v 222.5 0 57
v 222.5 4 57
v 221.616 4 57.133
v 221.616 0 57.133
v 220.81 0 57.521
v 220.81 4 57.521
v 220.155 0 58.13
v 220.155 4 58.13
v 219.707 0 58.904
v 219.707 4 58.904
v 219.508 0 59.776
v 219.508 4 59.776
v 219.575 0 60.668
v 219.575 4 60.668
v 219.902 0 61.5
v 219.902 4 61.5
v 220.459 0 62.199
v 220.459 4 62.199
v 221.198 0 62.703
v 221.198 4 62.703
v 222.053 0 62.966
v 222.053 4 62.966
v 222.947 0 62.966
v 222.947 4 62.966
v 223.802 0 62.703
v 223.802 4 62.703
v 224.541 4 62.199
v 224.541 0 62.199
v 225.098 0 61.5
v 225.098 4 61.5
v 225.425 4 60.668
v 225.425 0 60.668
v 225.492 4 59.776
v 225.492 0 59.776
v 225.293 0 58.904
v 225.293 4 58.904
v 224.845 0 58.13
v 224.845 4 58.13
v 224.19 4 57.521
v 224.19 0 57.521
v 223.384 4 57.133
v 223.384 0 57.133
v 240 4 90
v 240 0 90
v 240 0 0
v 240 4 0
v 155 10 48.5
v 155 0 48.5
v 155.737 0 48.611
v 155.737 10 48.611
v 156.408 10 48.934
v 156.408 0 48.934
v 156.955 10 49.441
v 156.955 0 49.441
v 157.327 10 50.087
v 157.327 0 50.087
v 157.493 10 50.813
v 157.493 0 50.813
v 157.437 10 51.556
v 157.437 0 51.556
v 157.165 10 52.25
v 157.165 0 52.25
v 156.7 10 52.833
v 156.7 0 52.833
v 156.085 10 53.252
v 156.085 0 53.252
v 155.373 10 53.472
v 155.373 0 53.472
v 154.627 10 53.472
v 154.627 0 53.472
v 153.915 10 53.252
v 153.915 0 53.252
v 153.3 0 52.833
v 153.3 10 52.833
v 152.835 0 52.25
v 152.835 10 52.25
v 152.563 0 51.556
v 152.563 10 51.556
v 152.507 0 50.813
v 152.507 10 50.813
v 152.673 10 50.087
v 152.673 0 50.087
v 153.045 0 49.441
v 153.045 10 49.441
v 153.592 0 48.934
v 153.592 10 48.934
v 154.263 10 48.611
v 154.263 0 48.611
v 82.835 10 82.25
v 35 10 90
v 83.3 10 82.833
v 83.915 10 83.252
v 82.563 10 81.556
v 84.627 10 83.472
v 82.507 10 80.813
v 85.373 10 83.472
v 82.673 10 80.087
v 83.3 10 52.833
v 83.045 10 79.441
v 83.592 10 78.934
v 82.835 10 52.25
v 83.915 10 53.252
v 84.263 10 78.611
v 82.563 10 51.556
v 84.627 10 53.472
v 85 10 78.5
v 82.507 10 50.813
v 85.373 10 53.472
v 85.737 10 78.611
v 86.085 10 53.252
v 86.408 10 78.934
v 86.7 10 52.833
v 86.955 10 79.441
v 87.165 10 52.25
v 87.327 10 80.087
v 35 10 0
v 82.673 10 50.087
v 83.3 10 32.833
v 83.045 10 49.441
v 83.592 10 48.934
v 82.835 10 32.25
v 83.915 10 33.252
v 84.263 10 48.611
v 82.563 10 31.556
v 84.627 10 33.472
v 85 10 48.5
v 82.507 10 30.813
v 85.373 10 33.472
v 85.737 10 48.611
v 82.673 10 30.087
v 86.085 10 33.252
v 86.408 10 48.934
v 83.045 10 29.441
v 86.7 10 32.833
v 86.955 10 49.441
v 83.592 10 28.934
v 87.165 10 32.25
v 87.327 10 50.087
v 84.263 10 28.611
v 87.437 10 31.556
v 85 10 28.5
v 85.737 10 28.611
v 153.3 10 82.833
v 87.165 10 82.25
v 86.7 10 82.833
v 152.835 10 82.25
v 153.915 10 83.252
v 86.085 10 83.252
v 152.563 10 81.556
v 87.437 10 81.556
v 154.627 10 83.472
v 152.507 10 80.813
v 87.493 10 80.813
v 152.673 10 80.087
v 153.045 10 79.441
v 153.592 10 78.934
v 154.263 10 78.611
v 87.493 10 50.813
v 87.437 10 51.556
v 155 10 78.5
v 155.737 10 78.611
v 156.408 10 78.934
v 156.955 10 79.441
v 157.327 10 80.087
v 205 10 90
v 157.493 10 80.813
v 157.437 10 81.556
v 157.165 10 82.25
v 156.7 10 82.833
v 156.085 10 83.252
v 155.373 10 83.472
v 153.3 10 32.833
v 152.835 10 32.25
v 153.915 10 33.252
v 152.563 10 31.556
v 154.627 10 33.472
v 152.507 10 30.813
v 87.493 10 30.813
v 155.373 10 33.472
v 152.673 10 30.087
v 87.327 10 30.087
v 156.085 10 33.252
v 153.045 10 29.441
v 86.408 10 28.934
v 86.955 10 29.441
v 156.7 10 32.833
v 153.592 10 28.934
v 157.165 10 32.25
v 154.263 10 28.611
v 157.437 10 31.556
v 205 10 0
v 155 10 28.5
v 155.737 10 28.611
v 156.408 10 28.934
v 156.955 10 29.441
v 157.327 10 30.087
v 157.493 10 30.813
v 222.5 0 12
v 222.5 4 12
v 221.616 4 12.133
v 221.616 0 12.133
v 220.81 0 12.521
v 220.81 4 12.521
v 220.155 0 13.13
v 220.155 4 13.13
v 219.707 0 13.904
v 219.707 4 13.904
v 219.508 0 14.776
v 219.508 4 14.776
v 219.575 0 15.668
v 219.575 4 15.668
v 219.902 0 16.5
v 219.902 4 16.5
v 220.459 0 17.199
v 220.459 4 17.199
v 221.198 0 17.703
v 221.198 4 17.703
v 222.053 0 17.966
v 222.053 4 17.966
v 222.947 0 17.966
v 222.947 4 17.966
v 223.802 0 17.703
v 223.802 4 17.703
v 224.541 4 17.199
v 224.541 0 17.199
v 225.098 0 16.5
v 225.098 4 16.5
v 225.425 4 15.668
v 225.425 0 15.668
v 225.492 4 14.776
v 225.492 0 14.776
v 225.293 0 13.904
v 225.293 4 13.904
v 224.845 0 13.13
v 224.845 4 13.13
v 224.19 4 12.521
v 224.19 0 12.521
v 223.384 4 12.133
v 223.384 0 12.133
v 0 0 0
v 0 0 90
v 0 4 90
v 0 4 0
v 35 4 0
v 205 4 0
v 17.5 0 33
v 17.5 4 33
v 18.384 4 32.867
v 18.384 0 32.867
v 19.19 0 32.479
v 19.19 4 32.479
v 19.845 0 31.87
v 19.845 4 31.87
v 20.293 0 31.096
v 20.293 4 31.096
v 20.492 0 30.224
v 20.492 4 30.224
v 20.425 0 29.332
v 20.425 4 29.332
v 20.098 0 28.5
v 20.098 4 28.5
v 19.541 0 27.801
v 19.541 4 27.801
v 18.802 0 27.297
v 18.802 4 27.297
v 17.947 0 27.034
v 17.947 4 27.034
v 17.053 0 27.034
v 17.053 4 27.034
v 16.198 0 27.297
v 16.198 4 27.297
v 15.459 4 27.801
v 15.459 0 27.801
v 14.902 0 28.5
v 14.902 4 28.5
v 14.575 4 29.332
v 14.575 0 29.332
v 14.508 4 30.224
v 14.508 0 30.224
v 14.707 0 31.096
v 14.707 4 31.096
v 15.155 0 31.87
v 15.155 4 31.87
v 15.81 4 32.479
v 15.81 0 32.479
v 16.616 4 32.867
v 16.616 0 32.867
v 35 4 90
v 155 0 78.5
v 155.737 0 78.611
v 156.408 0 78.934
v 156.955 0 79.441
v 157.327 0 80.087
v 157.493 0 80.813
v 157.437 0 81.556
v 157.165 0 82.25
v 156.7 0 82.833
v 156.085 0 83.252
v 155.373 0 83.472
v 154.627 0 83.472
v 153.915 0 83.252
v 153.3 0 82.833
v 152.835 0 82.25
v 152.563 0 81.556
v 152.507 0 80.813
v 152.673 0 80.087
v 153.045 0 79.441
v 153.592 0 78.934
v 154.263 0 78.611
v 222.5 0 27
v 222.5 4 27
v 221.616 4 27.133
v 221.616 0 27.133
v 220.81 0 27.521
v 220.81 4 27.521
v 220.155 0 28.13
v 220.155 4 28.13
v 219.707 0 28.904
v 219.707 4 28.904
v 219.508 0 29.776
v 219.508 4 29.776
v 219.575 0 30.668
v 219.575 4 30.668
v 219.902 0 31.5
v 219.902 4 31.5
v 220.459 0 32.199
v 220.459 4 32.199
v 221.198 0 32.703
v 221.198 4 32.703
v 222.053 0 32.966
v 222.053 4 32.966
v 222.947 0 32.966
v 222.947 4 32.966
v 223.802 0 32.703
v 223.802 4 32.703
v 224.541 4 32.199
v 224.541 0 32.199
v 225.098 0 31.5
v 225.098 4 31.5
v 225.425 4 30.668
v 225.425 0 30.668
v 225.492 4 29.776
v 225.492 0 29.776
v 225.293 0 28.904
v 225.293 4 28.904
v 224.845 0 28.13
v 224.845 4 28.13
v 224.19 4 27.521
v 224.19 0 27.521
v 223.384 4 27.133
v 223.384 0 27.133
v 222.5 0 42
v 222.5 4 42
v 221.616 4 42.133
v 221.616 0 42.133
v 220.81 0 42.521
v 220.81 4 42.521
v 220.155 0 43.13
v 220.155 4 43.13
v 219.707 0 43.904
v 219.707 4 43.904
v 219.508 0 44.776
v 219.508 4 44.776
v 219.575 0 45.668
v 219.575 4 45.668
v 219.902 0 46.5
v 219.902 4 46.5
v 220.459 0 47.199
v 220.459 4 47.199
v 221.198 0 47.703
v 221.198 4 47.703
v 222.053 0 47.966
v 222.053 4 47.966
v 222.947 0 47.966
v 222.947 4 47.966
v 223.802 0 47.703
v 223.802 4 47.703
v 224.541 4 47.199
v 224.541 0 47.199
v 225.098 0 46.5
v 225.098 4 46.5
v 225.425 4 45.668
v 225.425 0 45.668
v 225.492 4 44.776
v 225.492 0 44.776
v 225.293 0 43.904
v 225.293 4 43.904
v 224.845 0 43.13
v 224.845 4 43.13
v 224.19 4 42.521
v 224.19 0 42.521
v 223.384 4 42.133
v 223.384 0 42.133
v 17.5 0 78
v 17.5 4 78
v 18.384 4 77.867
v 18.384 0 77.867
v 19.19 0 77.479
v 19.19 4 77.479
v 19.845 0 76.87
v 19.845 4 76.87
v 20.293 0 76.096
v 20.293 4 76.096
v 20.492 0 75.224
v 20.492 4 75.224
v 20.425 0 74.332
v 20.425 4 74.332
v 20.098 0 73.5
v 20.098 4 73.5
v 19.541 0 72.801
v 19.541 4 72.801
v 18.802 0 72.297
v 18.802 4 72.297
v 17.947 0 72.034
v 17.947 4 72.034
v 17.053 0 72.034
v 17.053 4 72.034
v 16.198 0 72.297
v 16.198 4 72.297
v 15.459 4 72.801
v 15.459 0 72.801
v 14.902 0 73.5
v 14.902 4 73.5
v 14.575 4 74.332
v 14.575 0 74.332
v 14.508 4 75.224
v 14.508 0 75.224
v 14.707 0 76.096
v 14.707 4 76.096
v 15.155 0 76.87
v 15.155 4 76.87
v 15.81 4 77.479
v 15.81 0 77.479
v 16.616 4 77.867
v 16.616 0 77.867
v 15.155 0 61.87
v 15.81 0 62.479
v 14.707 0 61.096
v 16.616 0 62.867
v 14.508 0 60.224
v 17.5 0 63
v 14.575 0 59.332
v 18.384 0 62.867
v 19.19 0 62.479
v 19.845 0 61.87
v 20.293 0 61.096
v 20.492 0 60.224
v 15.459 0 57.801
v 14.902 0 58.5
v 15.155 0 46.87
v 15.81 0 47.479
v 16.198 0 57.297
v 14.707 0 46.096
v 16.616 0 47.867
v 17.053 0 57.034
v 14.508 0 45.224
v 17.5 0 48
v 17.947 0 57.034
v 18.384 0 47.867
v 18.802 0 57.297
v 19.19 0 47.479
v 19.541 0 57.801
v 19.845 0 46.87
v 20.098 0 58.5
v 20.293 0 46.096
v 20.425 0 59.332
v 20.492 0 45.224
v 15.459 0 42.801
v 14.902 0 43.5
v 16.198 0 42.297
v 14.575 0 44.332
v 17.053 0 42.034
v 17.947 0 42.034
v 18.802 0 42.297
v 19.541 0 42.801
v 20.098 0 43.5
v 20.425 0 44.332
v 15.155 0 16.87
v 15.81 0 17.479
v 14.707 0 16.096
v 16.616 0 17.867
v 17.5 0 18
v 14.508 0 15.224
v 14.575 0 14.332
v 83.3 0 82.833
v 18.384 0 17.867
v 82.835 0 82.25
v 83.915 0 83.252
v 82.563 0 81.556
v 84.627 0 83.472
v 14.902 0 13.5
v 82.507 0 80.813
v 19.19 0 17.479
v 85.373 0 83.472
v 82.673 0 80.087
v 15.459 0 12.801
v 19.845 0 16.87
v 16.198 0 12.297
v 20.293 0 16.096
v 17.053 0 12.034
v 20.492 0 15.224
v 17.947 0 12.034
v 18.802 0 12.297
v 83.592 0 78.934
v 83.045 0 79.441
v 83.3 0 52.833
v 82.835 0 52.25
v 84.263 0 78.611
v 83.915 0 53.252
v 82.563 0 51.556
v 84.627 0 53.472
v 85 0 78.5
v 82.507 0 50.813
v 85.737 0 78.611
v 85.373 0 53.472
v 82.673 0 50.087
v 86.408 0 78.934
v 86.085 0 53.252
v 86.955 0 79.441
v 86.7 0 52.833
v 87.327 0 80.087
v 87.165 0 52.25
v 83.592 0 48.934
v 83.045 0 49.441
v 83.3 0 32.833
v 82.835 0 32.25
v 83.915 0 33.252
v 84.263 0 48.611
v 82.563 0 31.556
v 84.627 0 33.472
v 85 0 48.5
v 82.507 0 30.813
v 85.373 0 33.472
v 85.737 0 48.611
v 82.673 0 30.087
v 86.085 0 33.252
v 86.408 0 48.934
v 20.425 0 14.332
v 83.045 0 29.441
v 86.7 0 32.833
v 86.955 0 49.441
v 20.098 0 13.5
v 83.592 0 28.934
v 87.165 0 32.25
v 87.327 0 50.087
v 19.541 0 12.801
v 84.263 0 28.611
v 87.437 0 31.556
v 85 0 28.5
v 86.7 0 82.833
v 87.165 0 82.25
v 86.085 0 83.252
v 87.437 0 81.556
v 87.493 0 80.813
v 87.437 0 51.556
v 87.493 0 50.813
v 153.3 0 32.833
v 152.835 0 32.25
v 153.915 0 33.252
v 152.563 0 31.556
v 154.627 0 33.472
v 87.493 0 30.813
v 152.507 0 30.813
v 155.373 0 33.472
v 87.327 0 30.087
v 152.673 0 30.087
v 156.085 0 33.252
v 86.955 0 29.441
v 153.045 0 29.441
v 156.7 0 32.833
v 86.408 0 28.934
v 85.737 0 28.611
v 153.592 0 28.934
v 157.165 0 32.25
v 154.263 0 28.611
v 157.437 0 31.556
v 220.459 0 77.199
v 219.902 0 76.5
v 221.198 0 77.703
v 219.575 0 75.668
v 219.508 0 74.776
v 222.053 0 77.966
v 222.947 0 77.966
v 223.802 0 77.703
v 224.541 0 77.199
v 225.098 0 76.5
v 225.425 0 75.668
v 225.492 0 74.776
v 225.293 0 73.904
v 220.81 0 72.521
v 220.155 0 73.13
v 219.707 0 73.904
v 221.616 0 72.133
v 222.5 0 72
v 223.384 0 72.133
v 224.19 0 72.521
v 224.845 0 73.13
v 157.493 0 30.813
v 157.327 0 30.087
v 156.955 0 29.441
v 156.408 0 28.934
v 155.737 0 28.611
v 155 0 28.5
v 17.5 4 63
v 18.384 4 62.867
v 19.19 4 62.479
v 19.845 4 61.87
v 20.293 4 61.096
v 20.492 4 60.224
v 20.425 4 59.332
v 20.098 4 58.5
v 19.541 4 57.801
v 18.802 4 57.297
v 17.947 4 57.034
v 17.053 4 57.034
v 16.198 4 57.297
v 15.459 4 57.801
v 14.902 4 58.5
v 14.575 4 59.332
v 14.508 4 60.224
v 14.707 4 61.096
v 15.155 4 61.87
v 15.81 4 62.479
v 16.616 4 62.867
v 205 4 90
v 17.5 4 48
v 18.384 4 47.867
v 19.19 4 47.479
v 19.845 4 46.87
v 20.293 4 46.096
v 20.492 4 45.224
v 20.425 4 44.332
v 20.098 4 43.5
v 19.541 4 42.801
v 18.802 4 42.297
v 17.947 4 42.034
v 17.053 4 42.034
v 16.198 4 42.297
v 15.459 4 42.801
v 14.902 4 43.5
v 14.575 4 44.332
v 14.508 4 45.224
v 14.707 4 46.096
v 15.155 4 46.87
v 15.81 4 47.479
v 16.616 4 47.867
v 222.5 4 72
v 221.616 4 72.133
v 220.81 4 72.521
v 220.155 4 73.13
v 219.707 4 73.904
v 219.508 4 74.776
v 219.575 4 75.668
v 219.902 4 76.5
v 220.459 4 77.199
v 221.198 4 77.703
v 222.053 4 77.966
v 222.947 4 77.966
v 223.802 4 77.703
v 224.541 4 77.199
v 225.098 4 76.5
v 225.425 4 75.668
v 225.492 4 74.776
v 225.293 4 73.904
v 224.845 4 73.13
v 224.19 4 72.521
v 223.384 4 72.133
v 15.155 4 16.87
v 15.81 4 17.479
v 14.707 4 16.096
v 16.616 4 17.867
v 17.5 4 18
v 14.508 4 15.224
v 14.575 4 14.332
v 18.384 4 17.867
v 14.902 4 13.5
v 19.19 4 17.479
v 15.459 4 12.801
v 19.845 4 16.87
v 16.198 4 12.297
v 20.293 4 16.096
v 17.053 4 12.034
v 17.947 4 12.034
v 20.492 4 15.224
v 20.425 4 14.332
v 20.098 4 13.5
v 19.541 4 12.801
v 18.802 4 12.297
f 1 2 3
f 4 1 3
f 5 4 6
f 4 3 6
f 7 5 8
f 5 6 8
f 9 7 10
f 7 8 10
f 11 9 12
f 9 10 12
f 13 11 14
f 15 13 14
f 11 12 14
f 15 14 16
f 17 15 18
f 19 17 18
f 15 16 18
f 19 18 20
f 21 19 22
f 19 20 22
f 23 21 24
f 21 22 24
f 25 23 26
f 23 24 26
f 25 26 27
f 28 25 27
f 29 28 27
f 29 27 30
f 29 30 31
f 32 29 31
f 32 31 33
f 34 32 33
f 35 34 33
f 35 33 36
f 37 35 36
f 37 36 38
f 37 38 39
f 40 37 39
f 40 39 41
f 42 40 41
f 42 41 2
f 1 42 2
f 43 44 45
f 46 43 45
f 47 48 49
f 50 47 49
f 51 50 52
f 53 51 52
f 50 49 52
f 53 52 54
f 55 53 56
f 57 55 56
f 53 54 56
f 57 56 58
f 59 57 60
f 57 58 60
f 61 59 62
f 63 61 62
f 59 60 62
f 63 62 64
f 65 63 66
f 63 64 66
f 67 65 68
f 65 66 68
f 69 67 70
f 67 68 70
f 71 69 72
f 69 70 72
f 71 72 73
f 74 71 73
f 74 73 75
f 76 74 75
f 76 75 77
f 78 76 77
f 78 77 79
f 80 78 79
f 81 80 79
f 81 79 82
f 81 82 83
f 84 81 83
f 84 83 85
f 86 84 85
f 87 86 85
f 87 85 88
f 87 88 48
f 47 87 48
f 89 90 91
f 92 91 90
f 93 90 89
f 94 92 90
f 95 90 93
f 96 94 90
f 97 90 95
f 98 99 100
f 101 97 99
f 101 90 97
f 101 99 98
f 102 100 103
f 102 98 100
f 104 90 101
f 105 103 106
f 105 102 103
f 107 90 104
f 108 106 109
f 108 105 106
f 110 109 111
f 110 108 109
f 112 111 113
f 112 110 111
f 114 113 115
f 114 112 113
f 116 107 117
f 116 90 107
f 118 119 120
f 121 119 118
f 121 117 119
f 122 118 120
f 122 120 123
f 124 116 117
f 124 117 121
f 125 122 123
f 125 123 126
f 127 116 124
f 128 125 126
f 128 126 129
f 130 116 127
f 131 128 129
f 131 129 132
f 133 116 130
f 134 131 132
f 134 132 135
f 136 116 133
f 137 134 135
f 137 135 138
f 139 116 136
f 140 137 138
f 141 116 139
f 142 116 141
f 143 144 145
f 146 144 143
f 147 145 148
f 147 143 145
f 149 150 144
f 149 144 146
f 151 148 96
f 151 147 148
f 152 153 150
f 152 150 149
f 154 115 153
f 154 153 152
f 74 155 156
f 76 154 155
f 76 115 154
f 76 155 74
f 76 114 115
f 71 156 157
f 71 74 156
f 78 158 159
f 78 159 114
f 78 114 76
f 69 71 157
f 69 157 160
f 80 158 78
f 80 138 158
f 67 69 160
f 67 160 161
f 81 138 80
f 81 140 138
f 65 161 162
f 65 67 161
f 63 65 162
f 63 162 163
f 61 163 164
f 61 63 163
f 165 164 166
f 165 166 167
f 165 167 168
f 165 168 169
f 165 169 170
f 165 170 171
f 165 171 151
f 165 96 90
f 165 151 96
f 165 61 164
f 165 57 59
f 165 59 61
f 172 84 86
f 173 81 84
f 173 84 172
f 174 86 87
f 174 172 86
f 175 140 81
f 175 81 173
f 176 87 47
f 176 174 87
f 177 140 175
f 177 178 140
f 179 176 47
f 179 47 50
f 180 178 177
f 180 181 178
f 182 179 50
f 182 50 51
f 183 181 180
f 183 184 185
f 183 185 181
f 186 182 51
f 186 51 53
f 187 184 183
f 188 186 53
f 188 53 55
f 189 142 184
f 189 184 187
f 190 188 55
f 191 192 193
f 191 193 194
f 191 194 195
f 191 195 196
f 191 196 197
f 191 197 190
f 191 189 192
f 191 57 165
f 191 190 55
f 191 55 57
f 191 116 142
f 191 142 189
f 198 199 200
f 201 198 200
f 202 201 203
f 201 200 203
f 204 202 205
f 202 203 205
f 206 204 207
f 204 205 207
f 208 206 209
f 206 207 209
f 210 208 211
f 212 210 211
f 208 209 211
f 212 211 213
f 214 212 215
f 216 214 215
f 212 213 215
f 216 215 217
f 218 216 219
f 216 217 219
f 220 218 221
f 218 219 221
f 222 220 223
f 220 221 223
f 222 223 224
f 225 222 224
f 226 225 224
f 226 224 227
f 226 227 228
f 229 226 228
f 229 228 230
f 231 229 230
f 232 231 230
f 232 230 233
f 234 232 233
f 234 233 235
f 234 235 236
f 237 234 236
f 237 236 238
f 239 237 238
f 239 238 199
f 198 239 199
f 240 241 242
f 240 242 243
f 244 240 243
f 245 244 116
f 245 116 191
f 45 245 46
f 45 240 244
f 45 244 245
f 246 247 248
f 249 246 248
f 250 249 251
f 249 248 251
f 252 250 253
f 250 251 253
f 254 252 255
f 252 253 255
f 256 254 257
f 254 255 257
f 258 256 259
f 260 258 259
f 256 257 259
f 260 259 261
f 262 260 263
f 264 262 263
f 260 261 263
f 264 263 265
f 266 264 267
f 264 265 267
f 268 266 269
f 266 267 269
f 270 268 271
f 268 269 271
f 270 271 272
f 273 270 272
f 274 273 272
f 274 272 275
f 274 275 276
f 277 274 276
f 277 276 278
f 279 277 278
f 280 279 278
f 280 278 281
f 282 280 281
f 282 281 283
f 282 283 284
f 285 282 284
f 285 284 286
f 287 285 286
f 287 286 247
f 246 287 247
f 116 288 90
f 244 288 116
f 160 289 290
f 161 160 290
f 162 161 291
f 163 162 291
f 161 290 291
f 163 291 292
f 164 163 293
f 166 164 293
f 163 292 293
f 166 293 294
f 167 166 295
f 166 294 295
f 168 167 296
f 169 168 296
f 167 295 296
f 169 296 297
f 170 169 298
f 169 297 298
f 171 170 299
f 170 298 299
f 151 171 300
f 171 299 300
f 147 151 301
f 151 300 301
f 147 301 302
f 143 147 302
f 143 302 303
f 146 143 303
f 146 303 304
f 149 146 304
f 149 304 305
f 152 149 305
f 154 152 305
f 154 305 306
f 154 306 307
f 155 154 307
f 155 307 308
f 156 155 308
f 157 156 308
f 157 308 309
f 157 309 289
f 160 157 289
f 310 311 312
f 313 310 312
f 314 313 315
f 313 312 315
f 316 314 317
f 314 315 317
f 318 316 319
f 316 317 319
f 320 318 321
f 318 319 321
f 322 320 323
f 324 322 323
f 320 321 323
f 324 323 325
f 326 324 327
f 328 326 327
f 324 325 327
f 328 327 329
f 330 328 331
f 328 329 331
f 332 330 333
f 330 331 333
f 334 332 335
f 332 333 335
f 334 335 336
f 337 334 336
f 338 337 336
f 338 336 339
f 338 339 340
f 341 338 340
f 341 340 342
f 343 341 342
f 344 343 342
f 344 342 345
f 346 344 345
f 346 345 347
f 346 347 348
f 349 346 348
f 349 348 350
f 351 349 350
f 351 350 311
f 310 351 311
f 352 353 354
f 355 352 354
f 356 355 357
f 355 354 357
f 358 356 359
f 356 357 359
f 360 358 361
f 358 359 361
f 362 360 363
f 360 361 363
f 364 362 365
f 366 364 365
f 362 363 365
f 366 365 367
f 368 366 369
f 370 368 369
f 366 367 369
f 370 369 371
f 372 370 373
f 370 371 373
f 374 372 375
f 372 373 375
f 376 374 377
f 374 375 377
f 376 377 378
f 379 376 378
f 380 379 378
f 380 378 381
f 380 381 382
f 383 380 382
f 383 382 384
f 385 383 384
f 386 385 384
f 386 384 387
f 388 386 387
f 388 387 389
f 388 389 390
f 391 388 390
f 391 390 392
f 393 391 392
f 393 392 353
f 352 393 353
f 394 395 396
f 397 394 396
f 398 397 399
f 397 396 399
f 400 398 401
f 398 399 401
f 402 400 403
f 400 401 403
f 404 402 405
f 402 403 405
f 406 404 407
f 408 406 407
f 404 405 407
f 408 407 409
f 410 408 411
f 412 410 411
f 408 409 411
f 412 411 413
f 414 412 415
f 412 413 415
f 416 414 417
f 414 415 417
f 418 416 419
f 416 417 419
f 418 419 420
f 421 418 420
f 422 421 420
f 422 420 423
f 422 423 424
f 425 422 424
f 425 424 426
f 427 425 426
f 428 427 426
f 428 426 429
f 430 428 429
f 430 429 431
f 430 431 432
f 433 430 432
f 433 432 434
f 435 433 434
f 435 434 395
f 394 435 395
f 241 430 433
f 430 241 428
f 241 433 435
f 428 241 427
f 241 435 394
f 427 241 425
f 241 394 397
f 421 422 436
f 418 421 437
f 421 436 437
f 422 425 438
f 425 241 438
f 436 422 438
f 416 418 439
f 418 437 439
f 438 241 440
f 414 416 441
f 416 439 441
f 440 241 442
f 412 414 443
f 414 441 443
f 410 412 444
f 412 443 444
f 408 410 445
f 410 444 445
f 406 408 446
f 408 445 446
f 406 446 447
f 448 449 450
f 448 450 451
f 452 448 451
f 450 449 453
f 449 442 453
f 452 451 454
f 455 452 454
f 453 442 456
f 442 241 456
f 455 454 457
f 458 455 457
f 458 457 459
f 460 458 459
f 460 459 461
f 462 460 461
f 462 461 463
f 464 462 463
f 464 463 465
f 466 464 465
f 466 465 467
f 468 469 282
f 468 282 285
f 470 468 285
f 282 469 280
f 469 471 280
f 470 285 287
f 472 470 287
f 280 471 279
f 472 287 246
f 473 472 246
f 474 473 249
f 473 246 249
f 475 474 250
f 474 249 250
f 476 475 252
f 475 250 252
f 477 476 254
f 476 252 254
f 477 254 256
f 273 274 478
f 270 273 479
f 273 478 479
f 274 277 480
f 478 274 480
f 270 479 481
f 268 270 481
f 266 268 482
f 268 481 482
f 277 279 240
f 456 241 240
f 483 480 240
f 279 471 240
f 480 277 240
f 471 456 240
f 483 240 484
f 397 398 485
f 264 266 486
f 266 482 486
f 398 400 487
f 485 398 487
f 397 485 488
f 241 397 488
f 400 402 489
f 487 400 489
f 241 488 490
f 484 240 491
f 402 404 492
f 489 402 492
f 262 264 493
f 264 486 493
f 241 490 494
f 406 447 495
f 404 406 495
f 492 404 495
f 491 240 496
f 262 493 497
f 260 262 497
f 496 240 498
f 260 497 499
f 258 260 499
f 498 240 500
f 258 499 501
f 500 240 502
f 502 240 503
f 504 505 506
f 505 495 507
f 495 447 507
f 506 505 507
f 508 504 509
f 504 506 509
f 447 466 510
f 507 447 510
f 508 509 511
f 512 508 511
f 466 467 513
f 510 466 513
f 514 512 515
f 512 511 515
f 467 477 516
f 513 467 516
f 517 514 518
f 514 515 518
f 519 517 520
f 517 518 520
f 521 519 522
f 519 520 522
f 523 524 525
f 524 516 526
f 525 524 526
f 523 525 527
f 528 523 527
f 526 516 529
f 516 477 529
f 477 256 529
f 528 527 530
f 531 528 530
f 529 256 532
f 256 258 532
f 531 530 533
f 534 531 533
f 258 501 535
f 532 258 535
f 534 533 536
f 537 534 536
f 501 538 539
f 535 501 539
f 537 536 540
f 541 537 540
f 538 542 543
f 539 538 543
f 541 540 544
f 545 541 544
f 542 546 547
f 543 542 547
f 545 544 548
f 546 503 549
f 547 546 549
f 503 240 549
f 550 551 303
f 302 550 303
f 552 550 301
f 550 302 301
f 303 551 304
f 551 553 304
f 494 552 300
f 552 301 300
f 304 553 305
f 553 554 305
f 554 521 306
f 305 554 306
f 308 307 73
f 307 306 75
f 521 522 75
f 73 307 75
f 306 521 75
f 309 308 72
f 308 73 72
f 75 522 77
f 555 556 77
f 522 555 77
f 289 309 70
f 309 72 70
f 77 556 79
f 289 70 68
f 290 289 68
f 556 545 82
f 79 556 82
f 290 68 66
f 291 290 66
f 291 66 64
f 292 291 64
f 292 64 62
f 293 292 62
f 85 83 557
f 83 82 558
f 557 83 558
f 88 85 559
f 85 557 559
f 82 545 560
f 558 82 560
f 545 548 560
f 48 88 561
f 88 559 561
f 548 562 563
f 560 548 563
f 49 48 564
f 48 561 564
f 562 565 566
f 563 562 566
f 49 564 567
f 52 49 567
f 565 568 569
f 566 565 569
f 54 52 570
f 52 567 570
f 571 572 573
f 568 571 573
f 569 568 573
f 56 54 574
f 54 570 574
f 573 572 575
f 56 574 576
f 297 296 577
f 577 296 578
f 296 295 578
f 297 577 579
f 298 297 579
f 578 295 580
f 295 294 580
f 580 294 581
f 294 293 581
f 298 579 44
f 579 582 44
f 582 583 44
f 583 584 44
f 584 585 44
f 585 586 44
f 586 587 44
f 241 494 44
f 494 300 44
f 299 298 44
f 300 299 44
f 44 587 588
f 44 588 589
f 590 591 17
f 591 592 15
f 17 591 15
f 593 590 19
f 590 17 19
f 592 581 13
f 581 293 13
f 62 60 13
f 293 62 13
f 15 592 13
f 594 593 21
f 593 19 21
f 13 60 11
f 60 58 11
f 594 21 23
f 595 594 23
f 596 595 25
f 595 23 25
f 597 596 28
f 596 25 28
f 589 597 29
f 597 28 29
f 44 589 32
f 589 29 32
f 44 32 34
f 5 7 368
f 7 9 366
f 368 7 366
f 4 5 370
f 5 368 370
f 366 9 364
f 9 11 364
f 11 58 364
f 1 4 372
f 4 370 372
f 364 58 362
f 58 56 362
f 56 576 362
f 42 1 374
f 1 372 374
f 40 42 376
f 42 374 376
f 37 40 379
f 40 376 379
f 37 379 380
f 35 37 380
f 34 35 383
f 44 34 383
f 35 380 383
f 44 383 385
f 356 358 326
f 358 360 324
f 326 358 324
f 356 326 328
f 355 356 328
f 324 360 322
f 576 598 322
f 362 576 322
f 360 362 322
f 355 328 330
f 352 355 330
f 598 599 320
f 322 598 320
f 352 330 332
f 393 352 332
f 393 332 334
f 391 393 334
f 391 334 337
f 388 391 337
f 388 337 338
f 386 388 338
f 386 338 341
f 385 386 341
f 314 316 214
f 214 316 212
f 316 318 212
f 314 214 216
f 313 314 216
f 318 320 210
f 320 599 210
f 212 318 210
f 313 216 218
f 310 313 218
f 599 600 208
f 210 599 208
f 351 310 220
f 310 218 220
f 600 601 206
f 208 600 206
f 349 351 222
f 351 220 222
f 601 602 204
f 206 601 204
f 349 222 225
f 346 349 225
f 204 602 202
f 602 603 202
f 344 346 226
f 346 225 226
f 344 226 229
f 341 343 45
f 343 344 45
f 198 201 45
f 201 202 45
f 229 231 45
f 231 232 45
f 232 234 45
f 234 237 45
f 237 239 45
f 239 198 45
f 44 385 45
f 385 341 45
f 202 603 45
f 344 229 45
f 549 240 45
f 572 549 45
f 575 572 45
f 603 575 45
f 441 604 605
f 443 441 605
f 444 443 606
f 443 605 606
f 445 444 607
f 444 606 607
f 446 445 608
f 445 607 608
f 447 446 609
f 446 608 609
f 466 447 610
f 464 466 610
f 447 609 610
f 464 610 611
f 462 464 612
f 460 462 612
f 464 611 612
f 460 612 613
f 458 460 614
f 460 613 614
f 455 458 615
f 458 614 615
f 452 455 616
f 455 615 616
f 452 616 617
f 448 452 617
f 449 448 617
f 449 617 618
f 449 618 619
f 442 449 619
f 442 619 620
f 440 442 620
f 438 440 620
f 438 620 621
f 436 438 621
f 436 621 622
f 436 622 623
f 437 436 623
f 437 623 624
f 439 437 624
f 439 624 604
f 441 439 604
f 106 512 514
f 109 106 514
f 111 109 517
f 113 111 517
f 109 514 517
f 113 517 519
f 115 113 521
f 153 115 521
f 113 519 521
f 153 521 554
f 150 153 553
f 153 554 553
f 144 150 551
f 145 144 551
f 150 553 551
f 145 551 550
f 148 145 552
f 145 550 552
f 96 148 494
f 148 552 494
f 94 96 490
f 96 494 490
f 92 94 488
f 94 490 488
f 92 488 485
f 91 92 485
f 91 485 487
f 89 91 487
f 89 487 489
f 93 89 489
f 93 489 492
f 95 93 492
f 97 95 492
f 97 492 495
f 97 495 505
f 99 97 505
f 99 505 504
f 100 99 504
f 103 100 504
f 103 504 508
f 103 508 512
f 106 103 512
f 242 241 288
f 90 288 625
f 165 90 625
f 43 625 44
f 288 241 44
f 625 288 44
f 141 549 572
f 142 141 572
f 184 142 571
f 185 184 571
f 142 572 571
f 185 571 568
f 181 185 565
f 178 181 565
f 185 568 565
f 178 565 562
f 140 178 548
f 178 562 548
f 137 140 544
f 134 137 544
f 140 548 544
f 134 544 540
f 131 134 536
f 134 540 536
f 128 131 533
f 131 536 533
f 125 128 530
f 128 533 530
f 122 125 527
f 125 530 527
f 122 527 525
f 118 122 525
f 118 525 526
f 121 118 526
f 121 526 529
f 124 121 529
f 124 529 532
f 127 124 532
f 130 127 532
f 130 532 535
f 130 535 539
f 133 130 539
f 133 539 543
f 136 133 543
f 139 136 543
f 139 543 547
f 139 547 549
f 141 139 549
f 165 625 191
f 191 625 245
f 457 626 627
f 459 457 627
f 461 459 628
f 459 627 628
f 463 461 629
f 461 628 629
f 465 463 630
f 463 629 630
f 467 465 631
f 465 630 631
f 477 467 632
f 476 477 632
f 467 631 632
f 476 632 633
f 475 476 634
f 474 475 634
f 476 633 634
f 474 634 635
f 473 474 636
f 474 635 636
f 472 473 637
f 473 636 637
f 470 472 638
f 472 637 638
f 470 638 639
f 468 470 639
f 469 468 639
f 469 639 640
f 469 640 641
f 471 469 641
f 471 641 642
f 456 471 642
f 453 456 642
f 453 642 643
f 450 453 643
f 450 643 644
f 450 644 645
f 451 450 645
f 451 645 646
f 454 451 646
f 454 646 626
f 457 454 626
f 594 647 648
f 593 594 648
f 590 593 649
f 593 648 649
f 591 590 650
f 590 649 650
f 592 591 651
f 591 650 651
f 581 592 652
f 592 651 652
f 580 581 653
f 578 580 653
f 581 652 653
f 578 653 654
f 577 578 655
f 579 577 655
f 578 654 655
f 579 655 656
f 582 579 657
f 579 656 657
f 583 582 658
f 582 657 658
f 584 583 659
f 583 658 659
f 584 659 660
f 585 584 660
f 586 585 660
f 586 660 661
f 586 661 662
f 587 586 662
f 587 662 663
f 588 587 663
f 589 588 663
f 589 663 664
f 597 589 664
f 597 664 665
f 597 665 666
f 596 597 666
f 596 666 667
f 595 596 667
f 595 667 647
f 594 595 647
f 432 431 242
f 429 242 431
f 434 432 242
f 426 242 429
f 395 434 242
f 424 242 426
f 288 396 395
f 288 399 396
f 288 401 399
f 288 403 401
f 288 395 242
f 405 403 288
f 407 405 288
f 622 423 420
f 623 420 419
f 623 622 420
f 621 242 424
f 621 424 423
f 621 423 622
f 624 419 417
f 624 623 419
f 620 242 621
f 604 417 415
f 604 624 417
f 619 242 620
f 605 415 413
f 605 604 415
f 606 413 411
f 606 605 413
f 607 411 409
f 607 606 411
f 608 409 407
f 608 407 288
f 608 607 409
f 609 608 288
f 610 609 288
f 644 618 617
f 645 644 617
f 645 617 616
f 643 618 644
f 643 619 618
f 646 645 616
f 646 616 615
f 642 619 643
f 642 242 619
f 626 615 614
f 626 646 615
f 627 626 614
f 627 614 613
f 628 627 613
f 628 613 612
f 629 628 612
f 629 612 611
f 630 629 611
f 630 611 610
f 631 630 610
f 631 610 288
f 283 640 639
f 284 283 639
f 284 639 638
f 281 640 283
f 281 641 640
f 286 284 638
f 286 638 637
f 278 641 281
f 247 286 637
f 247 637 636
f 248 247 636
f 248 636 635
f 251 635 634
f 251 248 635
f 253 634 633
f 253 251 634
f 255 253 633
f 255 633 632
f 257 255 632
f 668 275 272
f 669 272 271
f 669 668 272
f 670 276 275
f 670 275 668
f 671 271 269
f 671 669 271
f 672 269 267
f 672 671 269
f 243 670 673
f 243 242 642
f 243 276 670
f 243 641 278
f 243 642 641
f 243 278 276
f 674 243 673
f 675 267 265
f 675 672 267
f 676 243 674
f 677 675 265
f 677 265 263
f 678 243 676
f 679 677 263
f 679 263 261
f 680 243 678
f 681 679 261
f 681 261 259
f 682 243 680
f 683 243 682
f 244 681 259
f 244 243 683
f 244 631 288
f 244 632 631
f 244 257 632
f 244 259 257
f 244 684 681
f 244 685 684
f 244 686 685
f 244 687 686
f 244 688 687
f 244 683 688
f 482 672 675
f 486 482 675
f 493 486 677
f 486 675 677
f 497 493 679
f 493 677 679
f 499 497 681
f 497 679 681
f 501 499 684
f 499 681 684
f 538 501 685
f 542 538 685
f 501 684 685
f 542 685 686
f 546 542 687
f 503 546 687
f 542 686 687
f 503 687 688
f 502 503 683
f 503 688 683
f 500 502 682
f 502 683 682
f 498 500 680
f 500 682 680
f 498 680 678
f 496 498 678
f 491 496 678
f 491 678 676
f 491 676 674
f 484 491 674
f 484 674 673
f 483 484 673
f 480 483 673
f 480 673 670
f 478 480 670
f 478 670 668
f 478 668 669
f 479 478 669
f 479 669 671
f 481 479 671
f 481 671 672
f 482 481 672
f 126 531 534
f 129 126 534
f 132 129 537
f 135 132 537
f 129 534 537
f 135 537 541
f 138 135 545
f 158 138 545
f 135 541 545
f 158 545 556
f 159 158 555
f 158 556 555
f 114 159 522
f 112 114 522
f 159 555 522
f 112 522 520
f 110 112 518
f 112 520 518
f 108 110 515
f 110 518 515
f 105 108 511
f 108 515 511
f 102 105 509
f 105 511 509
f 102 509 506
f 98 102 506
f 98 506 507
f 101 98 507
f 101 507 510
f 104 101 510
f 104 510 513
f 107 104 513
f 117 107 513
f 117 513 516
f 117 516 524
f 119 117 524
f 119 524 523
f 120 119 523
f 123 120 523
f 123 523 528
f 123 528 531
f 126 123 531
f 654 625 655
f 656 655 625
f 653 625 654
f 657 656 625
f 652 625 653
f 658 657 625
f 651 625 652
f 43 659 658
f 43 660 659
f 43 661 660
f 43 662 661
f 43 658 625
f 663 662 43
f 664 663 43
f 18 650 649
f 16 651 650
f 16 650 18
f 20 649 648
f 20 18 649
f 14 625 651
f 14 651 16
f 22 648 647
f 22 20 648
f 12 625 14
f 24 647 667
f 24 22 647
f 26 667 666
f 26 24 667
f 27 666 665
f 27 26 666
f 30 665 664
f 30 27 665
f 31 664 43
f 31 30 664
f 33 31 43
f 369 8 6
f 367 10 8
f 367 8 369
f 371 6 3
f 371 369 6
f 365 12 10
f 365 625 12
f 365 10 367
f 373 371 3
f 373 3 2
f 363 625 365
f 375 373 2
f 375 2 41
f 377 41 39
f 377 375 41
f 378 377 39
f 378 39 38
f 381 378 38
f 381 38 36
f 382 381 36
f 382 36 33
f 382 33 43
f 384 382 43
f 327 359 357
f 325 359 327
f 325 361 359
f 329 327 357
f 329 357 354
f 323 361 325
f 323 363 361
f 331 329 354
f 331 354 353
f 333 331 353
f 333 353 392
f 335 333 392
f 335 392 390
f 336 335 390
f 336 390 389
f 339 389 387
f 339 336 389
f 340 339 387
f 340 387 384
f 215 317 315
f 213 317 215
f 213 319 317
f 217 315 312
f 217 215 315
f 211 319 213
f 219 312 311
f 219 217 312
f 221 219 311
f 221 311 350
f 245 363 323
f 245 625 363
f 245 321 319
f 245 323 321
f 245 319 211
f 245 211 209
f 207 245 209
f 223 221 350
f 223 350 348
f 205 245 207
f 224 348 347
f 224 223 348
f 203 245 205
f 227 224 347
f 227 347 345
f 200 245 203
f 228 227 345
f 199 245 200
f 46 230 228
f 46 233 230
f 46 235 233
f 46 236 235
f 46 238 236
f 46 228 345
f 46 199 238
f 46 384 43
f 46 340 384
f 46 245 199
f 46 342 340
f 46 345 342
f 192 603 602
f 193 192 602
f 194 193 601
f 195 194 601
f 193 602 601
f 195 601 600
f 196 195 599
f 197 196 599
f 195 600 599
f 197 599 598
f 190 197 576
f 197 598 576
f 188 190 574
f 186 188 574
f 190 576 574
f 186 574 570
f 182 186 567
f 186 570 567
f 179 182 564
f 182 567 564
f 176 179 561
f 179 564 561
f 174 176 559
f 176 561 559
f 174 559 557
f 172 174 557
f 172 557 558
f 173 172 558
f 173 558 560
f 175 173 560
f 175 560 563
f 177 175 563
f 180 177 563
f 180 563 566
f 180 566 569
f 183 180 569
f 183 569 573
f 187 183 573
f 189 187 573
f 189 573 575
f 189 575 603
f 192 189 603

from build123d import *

# Parameters (mm, degrees)
SKETCH_1_W          = 240
SKETCH_1_H          = 90
EXTRUDE_1_DEPTH     = 4
SKETCH_2_W          = 170
SKETCH_2_H          = 90
EXTRUDE_2_DEPTH     = 6
SKETCH_3_R          = 3
CUT_EXTRUDE_1_DEPTH = 257.390327431
SKETCH_4_R          = 2.5
CUT_EXTRUDE_5_DEPTH = 257.515106768


with BuildPart() as part:
    # 草图1 → 凸台-拉伸1 (new body)
    with BuildSketch(Plane(origin=(0, 0, 0), x_dir=(1, 0, 0), z_dir=(0, 1, 0))):
        with Locations((120, -45)):
            Rectangle(SKETCH_1_W, SKETCH_1_H)
    extrude(amount=EXTRUDE_1_DEPTH)

    # 草图2 → 凸台-拉伸2 (add)
    with BuildSketch(Plane(origin=(0, 4, 0), x_dir=(1, 0, 0), z_dir=(0, 1, 0))):
        with Locations((120, -45)):
            Rectangle(SKETCH_2_W, SKETCH_2_H)
    extrude(amount=EXTRUDE_2_DEPTH)

    # 草图3 → 切除-拉伸1 (cut, through all)
    with BuildSketch(Plane(origin=(0, 4, 0), x_dir=(1, 0, 0), z_dir=(0, 1, 0))):
        with Locations(Location((17.5, -15, 0), (0, 0, 270))):
            Circle(SKETCH_3_R)
        with Locations(Location((17.5, -30, 0), (0, 0, 270))):
            Circle(SKETCH_3_R)
        with Locations(Location((17.5, -45, 0), (0, 0, 270))):
            Circle(SKETCH_3_R)
        with Locations(Location((17.5, -60, 0), (0, 0, 270))):
            Circle(SKETCH_3_R)
        with Locations(Location((17.5, -75, 0), (0, 0, 270))):
            Circle(SKETCH_3_R)
        with Locations(Location((222.5, -75, 0), (0, 0, 90))):
            Circle(SKETCH_3_R)
        with Locations(Location((222.5, -60, 0), (0, 0, 90))):
            Circle(SKETCH_3_R)
        with Locations(Location((222.5, -45, 0), (0, 0, 90))):
            Circle(SKETCH_3_R)
        with Locations(Location((222.5, -30, 0), (0, 0, 90))):
            Circle(SKETCH_3_R)
        with Locations(Location((222.5, -15, 0), (0, 0, 90))):
            Circle(SKETCH_3_R)
    extrude(amount=-CUT_EXTRUDE_1_DEPTH, mode=Mode.SUBTRACT)

    # 草图4 → 切除-拉伸5 (cut, through all)
    with BuildSketch(Plane.XZ):
        with Locations(Location((85, 81, 0), (0, 0, 270))):
            Circle(SKETCH_4_R)
        with Locations(Location((155, 81, 0), (0, 0, 270))):
            Circle(SKETCH_4_R)
        with Locations(Location((85, 31, 0), (0, 0, 270))):
            Circle(SKETCH_4_R)
        with Locations(Location((155, 31, 0), (0, 0, 270))):
            Circle(SKETCH_4_R)
        with Locations(Location((85, 51, 0), (0, 0, 270))):
            Circle(SKETCH_4_R)
        with Locations(Location((155, 51, 0), (0, 0, 270))):
            Circle(SKETCH_4_R)
    extrude(amount=-CUT_EXTRUDE_5_DEPTH, mode=Mode.SUBTRACT)


solid = part.part
